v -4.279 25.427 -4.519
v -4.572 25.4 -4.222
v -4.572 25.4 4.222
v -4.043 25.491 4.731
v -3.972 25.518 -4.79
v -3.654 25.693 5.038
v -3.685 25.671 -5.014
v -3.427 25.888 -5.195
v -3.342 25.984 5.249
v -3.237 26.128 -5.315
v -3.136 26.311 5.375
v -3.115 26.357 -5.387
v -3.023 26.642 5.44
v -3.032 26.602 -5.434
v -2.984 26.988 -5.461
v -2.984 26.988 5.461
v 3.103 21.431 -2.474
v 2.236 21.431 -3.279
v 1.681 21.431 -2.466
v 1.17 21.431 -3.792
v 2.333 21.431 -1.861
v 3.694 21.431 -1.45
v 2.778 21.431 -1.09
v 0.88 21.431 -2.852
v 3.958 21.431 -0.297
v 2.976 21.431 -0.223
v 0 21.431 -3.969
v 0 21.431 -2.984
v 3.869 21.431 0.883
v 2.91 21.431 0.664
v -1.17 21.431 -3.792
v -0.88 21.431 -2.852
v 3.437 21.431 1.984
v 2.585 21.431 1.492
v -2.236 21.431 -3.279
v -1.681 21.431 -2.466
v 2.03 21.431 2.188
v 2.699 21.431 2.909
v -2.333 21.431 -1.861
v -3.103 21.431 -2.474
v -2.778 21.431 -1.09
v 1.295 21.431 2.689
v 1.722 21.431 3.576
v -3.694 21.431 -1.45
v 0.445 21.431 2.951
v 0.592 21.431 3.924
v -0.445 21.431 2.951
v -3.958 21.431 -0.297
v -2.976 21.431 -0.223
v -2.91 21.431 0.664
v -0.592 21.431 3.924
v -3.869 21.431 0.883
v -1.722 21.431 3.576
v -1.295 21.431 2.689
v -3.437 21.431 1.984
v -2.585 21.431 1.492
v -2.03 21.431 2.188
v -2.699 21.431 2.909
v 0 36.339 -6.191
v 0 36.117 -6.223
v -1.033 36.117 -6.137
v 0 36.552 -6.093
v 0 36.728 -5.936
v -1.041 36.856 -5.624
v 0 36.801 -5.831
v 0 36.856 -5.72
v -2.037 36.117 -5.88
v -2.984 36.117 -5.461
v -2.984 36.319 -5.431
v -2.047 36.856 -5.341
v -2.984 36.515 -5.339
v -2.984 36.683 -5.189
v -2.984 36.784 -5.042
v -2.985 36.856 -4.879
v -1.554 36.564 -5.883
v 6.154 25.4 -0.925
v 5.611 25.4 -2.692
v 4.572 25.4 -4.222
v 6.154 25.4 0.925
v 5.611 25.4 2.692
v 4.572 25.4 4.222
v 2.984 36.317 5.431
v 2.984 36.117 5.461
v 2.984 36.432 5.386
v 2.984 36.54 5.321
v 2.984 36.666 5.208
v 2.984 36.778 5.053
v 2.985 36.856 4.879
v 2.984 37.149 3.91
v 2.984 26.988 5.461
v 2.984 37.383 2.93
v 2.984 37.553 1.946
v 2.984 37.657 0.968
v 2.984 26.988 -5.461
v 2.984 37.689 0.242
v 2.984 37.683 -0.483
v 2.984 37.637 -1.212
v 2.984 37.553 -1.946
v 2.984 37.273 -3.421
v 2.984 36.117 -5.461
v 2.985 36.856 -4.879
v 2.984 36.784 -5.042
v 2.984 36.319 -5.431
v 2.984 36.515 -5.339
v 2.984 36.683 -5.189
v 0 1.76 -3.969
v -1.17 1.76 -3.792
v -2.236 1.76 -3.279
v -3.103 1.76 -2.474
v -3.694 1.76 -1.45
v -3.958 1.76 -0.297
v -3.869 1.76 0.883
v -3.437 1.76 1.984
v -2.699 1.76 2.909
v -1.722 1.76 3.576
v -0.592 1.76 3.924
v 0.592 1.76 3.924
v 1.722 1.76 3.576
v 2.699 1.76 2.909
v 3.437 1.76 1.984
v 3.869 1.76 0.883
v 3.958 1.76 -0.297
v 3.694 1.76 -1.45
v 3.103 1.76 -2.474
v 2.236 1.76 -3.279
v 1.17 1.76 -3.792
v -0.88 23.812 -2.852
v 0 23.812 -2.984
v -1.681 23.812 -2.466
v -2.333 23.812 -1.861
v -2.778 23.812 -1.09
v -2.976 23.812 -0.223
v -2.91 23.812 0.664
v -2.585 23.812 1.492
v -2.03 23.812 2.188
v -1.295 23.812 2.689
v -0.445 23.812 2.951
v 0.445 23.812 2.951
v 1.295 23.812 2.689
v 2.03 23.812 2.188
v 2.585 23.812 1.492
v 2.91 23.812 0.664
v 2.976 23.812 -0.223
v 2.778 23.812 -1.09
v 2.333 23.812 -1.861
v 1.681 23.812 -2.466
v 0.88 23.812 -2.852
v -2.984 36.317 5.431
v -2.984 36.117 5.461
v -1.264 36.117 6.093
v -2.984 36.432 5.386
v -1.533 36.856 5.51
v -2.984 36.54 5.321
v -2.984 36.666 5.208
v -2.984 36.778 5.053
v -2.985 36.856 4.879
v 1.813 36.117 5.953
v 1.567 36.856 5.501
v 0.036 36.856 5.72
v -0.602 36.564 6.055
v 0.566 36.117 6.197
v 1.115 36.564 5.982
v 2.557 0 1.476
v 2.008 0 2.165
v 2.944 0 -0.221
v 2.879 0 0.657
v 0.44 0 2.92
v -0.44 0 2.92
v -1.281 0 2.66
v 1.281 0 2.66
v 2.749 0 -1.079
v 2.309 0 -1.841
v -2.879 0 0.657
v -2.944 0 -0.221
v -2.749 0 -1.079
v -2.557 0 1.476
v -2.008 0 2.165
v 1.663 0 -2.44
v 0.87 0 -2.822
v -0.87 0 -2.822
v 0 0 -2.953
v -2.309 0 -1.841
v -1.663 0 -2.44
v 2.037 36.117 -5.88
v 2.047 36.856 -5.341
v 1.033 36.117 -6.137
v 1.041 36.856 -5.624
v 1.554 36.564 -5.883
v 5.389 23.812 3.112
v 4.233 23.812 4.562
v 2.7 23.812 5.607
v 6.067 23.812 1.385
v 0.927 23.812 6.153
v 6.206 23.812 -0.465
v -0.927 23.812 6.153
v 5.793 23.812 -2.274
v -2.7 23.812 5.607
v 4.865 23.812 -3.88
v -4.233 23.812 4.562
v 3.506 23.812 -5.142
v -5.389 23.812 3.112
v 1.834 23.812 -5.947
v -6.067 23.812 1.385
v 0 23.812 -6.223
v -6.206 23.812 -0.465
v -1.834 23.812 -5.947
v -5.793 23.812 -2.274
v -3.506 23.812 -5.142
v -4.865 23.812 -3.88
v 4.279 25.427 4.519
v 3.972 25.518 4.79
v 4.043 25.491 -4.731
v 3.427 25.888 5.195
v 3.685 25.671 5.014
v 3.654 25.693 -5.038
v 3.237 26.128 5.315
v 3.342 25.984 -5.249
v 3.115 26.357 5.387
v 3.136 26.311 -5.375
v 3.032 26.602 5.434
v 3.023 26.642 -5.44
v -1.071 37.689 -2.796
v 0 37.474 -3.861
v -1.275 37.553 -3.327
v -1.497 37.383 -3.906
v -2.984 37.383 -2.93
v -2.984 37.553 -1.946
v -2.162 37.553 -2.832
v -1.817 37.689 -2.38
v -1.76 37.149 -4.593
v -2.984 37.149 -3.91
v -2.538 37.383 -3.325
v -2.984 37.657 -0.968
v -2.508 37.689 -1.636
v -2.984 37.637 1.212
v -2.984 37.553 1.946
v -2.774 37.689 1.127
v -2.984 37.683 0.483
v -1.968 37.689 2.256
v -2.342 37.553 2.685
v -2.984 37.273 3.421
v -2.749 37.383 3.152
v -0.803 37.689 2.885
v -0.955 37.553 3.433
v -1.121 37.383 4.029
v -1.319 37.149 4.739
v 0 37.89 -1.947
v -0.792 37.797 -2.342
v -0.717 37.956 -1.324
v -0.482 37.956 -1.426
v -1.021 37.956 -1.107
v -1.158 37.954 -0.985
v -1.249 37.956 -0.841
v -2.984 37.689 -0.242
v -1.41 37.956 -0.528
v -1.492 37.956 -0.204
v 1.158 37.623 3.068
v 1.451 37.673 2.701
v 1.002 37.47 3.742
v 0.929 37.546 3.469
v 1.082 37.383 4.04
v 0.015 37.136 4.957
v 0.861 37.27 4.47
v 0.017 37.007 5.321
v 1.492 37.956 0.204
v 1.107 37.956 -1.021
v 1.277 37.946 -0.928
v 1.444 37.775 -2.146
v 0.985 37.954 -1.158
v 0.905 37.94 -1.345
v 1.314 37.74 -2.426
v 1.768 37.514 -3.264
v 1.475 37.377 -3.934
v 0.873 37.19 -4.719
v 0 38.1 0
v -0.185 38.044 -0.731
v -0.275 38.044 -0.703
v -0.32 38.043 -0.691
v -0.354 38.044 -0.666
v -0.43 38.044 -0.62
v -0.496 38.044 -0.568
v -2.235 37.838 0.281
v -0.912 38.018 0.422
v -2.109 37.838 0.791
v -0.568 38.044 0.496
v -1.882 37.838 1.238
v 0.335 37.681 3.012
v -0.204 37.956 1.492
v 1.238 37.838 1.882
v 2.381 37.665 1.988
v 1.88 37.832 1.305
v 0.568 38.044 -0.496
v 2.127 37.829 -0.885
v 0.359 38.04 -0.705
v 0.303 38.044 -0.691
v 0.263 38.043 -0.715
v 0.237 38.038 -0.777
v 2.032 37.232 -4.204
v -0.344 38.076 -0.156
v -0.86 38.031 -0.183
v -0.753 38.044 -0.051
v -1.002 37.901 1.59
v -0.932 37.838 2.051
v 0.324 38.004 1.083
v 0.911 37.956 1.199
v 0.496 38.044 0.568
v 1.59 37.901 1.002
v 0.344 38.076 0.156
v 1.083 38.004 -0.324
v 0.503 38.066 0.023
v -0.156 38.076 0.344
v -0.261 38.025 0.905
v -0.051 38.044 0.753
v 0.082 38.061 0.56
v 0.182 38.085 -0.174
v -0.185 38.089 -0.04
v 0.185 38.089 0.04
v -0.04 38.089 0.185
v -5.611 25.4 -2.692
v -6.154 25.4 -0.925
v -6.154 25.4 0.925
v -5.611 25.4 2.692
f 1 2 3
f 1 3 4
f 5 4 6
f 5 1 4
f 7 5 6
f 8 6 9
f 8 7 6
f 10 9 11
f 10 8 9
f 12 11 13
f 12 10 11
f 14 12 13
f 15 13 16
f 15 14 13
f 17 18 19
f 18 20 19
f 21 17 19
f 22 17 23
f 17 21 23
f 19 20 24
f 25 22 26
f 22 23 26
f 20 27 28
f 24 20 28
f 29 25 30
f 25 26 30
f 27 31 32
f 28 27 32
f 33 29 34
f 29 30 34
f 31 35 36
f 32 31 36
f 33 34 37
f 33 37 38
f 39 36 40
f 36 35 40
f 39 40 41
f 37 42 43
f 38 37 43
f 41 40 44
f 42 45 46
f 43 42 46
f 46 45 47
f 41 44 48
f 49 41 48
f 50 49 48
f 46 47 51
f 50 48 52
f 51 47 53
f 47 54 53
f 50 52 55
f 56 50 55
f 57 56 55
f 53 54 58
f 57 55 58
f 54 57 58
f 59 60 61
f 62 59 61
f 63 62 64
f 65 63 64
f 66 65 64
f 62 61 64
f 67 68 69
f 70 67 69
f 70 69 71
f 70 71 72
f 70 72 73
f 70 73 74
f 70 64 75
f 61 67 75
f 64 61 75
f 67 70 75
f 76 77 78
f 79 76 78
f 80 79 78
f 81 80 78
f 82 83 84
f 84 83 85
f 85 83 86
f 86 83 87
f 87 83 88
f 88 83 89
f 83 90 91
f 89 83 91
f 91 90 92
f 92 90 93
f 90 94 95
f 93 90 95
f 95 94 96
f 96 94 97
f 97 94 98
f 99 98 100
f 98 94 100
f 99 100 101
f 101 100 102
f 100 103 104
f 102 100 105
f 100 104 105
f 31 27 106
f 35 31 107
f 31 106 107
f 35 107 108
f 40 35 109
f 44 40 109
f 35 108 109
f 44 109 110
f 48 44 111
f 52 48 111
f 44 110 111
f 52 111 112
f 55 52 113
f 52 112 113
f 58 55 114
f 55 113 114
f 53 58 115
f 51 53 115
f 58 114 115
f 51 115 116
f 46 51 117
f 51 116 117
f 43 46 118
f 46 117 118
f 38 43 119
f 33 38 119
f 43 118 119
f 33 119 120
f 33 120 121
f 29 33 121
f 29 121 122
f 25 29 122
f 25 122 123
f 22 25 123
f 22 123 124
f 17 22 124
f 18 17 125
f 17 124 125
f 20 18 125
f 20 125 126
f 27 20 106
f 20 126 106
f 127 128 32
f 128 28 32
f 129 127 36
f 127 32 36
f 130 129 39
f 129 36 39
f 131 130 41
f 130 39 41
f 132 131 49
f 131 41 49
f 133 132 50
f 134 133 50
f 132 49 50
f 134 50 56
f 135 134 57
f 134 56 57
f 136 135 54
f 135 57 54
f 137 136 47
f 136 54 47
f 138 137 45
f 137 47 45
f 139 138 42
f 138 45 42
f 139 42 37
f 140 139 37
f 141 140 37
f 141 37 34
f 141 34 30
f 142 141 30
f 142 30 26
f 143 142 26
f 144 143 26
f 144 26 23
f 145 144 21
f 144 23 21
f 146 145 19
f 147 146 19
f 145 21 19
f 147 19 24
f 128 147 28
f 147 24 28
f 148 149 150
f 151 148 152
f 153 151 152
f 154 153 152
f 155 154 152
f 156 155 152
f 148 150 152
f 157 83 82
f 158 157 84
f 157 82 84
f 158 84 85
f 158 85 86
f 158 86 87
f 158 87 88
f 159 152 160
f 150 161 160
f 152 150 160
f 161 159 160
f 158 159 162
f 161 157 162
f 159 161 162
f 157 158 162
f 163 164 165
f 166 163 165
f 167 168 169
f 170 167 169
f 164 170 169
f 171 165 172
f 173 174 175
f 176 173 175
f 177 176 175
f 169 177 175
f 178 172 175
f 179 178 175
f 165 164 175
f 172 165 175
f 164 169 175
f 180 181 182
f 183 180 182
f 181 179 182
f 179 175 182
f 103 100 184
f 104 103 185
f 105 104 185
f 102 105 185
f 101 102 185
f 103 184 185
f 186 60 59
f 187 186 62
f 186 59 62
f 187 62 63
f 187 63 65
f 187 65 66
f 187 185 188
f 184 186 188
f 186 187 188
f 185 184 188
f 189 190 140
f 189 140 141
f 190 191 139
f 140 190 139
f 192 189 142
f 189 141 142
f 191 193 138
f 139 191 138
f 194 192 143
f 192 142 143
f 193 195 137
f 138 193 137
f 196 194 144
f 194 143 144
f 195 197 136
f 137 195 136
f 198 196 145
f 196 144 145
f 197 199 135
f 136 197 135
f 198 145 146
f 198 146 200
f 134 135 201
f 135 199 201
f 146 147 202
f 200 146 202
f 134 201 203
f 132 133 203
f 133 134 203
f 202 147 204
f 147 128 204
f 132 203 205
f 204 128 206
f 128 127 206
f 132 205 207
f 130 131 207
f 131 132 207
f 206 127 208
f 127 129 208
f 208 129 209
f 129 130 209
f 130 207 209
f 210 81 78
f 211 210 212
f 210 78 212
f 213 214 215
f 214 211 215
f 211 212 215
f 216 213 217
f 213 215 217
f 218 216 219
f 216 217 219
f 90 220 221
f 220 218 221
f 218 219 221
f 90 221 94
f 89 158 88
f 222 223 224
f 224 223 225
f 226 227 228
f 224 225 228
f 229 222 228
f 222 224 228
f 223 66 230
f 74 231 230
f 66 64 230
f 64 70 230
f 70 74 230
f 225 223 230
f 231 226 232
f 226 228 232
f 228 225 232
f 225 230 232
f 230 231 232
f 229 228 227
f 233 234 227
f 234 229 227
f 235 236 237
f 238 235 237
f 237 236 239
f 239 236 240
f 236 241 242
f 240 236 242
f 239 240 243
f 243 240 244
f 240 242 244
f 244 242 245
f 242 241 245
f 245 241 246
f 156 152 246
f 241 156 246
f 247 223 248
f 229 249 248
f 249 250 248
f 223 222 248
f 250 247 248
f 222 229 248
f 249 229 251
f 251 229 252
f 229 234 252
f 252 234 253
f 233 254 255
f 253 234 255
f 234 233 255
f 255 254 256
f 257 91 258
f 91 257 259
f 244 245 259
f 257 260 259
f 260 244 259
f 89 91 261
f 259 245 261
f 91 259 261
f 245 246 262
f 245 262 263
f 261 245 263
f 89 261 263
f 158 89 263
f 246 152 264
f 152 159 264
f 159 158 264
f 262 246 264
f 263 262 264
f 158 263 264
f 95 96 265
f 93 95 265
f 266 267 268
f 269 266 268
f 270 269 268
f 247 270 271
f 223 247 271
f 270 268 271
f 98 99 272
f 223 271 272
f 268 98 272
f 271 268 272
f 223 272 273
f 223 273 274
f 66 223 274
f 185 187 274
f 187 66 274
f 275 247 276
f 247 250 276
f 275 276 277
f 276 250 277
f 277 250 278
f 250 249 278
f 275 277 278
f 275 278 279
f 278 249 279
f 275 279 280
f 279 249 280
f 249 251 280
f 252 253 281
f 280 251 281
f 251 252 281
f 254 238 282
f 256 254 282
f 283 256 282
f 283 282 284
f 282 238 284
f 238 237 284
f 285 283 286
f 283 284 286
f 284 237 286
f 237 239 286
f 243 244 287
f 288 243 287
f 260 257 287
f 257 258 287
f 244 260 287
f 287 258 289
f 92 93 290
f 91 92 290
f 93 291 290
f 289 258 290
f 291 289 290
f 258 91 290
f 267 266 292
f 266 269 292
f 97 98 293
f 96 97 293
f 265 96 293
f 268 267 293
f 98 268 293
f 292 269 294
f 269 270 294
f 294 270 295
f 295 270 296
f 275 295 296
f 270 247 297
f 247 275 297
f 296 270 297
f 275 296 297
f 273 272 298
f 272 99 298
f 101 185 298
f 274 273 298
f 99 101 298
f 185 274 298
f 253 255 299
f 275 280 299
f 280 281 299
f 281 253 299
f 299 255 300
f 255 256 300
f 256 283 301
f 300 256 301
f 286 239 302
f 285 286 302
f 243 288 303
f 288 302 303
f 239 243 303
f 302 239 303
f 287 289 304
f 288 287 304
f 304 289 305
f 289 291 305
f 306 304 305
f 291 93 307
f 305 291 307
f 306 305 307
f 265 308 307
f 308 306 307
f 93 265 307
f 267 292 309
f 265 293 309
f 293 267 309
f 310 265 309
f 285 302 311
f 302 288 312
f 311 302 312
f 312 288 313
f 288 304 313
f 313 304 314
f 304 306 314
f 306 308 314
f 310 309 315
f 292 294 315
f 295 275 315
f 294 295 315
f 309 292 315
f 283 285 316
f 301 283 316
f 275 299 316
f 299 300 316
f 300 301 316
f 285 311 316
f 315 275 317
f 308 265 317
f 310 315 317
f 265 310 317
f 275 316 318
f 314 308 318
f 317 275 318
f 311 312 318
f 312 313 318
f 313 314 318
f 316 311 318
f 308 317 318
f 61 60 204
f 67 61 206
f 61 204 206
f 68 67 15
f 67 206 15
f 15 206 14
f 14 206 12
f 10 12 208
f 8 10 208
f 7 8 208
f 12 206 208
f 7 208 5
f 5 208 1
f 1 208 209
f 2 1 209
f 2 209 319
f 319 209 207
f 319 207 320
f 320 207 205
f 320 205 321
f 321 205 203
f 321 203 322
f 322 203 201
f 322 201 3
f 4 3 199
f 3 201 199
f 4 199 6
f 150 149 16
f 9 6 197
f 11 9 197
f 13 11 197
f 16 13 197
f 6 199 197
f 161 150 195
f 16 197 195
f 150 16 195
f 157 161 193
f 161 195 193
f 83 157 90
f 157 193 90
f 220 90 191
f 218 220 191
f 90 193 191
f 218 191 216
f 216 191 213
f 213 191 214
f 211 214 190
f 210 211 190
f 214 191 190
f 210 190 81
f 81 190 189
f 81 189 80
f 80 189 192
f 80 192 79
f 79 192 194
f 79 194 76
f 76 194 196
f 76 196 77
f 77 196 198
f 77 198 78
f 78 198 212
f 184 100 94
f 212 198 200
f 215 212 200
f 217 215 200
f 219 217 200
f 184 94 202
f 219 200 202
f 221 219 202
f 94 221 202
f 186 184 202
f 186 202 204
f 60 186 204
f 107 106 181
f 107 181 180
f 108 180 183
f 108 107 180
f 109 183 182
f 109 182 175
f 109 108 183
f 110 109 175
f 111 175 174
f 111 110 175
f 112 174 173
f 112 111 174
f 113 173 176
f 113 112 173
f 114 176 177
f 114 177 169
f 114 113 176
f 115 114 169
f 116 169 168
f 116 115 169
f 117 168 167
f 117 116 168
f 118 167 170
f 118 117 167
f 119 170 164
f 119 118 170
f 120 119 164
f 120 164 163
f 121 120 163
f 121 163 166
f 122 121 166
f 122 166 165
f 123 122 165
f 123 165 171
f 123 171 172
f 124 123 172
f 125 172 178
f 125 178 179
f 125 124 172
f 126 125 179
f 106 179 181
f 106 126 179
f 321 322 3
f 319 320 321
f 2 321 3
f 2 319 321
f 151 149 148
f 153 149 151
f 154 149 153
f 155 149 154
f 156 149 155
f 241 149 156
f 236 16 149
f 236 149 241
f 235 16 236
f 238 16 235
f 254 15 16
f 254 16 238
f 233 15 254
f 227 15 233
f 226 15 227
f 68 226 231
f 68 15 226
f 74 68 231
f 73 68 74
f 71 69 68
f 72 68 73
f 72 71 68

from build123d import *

# Parameters (mm, degrees)
CUT_EXTRUDE1_DEPTH      = 40.103215572
CUT_EXTRUDE1_DEPTH_BACK = 40.103215572
CHAMFER1_SIZE           = 1.016
CHAMFER1_SIZE2          = 1.75976362
FILLET1_R               = 0.79375


with BuildPart() as part:
    # Sketch1 → Revolve1 (revolve)
    with BuildSketch(Plane.XY, mode=Mode.PRIVATE) as revolve1_sk:
        with BuildLine():
            Line((6.223, 36.649006265), (6.223, 23.8125))
            Line((6.223, 23.8125), (2.9845, 23.8125))
            Line((2.9845, 23.8125), (2.9845, 21.43125))
            Line((2.9845, 21.43125), (3.96875, 21.43125))
            Line((3.96875, 21.43125), (3.96875, 0))
            Line((3.96875, 0), (0, 0))
            Line((0, 0), (0, 38.1))
            ThreePointArc((0, 38.1), (3.175227984, 37.647818746), (6.223, 36.649006265))
        make_face()
    revolve(revolve1_sk.sketch.rotate(Axis((0, 0, 0), (0, 1, 0)), 90), axis=Axis((0, 0, 0), (0, 1, 0)))

    # Sketch2 → Cut-Extrude1 (cut, two sides: drawn at the far end of the back side and taken through both)
    with BuildSketch(Plane.XY.offset(-CUT_EXTRUDE1_DEPTH_BACK)):
        with BuildLine():
            Line((-6.223, 25.4), (-4.572, 25.4))
            ThreePointArc((-4.572, 25.4), (-3.449467985, 25.864967985), (-2.9845, 26.9875))
            Line((-2.9845, 26.9875), (-2.9845, 38.1))
            Line((-2.9845, 38.1), (-6.223, 38.1))
            Line((-6.223, 38.1), (-6.223, 25.4))
        make_face()
        with BuildLine():
            Line((6.223, 38.1), (6.223, 25.4))
            Line((6.223, 25.4), (4.572, 25.4))
            ThreePointArc((4.572, 25.4), (3.449467985, 25.864967985), (2.9845, 26.9875))
            Line((2.9845, 26.9875), (2.9845, 38.1))
            Line((2.9845, 38.1), (6.223, 38.1))
        make_face()
    extrude(amount=CUT_EXTRUDE1_DEPTH + CUT_EXTRUDE1_DEPTH_BACK, mode=Mode.SUBTRACT)

    # Chamfer1
    chamfer1_edges = [part.edges().sort_by_distance(p)[0] for p in [
        (0, 0, 3.96875),
    ]]
    chamfer1_side = [part.faces().sort_by_distance(p)[0] for p in [
        (0, 0, 0),
    ]]
    chamfer(chamfer1_edges, length=CHAMFER1_SIZE, length2=CHAMFER1_SIZE2, reference=chamfer1_side[0])

    # Fillet1
    fillet1_edges = [part.edges().sort_by_distance(p)[0] for p in [
        (1.540166147, 36.649006265, -6.029396092),
        (0, 36.649006265, 6.223),
    ]]
    fillet(fillet1_edges, radius=FILLET1_R)


solid = part.part
